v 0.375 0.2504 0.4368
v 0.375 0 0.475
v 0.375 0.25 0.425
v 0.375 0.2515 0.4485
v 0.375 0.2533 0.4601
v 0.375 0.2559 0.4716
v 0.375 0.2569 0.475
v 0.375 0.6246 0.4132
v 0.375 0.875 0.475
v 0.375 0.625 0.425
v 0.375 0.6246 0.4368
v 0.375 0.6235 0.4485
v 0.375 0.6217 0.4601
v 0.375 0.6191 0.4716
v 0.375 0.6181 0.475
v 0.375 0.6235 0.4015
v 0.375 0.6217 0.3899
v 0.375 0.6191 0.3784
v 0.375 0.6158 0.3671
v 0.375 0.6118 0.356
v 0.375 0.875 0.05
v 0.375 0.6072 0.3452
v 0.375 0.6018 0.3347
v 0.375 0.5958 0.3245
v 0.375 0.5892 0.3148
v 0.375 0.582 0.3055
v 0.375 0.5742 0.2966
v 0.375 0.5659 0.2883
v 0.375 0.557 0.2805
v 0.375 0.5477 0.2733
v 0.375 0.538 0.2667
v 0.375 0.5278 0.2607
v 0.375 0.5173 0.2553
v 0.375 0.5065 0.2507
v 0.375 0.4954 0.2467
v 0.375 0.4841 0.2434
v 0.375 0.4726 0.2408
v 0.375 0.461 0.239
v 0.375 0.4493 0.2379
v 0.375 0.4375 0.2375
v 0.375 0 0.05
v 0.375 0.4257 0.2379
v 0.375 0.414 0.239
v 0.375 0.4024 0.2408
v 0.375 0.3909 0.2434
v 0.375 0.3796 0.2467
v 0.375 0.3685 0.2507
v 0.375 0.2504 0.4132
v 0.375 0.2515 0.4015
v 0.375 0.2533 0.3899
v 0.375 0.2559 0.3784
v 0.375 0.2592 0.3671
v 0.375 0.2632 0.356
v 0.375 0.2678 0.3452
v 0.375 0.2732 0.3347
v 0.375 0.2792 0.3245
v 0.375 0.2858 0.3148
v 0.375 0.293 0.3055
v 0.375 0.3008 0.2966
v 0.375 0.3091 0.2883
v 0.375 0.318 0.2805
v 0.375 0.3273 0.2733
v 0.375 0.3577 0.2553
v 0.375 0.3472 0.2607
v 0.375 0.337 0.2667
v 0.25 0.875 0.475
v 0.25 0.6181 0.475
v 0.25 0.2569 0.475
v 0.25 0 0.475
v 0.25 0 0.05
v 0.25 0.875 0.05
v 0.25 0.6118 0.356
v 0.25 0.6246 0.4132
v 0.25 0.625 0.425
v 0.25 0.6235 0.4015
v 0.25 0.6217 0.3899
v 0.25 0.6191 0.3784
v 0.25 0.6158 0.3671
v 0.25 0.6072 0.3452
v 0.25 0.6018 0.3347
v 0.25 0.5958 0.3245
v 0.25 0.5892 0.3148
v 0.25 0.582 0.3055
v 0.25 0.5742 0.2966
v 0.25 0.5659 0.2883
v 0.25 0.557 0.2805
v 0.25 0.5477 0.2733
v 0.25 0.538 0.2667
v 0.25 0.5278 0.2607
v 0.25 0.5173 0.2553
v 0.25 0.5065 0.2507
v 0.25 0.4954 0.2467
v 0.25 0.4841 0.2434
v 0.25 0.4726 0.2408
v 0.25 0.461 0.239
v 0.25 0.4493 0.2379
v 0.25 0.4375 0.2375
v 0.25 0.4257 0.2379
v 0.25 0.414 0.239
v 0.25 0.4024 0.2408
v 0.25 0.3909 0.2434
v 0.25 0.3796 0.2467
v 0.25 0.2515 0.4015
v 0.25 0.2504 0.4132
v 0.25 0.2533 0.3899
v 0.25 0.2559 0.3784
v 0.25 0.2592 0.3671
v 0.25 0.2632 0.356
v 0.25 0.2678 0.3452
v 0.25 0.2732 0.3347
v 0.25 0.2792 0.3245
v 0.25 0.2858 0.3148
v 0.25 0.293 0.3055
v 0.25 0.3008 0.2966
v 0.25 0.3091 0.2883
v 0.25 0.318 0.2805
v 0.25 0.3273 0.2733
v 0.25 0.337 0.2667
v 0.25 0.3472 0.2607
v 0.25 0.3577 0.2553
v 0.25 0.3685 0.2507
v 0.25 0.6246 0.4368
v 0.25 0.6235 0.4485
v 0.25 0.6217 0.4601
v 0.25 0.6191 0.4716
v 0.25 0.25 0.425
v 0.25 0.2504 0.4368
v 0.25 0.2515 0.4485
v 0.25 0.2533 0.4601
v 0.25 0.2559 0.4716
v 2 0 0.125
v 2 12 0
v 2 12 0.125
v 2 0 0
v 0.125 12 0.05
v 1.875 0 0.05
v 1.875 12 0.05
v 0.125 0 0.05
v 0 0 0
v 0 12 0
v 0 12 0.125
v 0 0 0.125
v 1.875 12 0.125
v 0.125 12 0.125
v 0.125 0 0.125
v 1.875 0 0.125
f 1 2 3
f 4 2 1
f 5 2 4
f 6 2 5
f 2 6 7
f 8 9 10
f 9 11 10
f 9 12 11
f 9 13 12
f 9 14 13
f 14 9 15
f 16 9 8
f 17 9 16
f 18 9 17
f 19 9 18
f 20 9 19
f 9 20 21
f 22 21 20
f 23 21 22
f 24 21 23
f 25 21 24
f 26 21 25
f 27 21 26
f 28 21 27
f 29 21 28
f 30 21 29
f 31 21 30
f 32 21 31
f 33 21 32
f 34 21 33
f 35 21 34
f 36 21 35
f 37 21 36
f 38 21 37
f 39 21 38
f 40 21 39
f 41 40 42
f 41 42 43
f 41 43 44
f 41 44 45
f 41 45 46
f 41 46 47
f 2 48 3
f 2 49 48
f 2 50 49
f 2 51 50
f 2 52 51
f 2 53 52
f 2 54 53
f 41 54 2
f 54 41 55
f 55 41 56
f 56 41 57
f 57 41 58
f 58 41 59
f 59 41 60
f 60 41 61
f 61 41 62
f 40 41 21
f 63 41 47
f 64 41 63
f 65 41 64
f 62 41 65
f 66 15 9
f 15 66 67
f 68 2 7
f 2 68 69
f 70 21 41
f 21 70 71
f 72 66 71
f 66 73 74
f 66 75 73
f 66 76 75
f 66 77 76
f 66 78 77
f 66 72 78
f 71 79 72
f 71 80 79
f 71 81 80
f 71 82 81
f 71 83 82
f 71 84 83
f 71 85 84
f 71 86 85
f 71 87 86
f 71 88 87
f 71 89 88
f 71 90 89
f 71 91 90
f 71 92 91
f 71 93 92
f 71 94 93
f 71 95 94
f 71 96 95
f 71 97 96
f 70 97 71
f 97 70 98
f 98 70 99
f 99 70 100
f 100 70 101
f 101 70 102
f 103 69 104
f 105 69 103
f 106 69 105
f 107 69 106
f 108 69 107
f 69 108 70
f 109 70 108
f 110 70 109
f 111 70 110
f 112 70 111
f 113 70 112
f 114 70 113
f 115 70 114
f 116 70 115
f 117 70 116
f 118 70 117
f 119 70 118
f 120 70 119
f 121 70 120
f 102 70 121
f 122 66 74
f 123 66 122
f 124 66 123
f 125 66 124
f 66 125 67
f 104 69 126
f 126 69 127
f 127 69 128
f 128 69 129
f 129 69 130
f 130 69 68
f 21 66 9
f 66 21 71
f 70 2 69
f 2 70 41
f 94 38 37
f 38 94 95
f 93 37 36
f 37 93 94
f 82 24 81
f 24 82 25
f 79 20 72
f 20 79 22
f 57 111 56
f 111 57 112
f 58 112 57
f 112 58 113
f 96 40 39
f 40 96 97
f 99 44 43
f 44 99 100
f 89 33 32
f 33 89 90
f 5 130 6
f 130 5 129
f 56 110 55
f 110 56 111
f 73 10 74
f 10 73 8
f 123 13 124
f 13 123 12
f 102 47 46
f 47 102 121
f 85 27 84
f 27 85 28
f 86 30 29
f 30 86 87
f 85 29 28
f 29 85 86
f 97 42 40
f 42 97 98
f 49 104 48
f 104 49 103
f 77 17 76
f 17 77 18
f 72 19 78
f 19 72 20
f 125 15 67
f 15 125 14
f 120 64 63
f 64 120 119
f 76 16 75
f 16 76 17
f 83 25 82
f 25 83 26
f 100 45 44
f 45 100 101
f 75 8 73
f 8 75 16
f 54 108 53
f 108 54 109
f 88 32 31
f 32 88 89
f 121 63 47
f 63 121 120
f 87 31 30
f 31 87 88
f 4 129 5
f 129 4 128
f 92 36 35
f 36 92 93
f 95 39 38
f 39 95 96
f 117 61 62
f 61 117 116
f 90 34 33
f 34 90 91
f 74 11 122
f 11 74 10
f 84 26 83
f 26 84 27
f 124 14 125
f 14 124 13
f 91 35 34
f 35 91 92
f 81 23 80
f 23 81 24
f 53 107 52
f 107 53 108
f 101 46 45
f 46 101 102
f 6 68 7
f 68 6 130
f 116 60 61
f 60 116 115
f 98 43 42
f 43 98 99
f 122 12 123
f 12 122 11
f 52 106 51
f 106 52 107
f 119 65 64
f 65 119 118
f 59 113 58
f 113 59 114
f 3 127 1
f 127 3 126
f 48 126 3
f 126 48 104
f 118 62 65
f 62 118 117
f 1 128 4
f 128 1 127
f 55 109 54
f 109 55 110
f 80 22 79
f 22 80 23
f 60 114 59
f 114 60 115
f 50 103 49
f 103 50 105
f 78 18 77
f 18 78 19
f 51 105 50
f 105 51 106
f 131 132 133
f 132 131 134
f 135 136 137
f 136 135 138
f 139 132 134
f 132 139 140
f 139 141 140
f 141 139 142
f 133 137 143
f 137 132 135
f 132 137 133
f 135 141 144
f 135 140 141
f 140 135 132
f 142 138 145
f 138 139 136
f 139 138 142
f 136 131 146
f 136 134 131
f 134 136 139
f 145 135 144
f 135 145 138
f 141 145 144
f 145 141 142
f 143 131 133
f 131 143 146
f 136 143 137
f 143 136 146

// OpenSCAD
wood_thickness = 0.75;
acrylic_width = 2;
acrylic_thickness = 0.05;
acrylic_length = 12;
overlap_height = 0.125;
overlap_width = 0.125;

module acrylic() color([1, 1, 1, 0.5]) children();

acrylic() cube([acrylic_width, acrylic_length, acrylic_thickness]);
acrylic() cube([overlap_width, acrylic_length, overlap_height]);
translate([acrylic_width - overlap_width, 0, 0])
  acrylic() cube([overlap_width, acrylic_length, overlap_height]);

dowel_size = 3/8;
dowel_offset = 2;
clip_width = 0.125;
clip_thickness = 0.25;
clip_overhang = 0.05;
clip_gap = (wood_thickness - dowel_size) / 2;
clip_height = clip_gap + dowel_size / 2 + clip_overhang;
clip_position = 0.25;

$fn = 100;

module clip() {
  translate([clip_position, 0, acrylic_thickness]) {
    difference() {
      acrylic()
        cube([clip_width, clip_thickness * 2 + dowel_size, clip_height]);
      rotate([0, 90, 0]) translate([-dowel_size / 2 - clip_gap, dowel_size / 2 + clip_thickness, -1]) cylinder(clip_width + 2, dowel_size / 2, dowel_size / 2);
    }
  }
}

clip();
